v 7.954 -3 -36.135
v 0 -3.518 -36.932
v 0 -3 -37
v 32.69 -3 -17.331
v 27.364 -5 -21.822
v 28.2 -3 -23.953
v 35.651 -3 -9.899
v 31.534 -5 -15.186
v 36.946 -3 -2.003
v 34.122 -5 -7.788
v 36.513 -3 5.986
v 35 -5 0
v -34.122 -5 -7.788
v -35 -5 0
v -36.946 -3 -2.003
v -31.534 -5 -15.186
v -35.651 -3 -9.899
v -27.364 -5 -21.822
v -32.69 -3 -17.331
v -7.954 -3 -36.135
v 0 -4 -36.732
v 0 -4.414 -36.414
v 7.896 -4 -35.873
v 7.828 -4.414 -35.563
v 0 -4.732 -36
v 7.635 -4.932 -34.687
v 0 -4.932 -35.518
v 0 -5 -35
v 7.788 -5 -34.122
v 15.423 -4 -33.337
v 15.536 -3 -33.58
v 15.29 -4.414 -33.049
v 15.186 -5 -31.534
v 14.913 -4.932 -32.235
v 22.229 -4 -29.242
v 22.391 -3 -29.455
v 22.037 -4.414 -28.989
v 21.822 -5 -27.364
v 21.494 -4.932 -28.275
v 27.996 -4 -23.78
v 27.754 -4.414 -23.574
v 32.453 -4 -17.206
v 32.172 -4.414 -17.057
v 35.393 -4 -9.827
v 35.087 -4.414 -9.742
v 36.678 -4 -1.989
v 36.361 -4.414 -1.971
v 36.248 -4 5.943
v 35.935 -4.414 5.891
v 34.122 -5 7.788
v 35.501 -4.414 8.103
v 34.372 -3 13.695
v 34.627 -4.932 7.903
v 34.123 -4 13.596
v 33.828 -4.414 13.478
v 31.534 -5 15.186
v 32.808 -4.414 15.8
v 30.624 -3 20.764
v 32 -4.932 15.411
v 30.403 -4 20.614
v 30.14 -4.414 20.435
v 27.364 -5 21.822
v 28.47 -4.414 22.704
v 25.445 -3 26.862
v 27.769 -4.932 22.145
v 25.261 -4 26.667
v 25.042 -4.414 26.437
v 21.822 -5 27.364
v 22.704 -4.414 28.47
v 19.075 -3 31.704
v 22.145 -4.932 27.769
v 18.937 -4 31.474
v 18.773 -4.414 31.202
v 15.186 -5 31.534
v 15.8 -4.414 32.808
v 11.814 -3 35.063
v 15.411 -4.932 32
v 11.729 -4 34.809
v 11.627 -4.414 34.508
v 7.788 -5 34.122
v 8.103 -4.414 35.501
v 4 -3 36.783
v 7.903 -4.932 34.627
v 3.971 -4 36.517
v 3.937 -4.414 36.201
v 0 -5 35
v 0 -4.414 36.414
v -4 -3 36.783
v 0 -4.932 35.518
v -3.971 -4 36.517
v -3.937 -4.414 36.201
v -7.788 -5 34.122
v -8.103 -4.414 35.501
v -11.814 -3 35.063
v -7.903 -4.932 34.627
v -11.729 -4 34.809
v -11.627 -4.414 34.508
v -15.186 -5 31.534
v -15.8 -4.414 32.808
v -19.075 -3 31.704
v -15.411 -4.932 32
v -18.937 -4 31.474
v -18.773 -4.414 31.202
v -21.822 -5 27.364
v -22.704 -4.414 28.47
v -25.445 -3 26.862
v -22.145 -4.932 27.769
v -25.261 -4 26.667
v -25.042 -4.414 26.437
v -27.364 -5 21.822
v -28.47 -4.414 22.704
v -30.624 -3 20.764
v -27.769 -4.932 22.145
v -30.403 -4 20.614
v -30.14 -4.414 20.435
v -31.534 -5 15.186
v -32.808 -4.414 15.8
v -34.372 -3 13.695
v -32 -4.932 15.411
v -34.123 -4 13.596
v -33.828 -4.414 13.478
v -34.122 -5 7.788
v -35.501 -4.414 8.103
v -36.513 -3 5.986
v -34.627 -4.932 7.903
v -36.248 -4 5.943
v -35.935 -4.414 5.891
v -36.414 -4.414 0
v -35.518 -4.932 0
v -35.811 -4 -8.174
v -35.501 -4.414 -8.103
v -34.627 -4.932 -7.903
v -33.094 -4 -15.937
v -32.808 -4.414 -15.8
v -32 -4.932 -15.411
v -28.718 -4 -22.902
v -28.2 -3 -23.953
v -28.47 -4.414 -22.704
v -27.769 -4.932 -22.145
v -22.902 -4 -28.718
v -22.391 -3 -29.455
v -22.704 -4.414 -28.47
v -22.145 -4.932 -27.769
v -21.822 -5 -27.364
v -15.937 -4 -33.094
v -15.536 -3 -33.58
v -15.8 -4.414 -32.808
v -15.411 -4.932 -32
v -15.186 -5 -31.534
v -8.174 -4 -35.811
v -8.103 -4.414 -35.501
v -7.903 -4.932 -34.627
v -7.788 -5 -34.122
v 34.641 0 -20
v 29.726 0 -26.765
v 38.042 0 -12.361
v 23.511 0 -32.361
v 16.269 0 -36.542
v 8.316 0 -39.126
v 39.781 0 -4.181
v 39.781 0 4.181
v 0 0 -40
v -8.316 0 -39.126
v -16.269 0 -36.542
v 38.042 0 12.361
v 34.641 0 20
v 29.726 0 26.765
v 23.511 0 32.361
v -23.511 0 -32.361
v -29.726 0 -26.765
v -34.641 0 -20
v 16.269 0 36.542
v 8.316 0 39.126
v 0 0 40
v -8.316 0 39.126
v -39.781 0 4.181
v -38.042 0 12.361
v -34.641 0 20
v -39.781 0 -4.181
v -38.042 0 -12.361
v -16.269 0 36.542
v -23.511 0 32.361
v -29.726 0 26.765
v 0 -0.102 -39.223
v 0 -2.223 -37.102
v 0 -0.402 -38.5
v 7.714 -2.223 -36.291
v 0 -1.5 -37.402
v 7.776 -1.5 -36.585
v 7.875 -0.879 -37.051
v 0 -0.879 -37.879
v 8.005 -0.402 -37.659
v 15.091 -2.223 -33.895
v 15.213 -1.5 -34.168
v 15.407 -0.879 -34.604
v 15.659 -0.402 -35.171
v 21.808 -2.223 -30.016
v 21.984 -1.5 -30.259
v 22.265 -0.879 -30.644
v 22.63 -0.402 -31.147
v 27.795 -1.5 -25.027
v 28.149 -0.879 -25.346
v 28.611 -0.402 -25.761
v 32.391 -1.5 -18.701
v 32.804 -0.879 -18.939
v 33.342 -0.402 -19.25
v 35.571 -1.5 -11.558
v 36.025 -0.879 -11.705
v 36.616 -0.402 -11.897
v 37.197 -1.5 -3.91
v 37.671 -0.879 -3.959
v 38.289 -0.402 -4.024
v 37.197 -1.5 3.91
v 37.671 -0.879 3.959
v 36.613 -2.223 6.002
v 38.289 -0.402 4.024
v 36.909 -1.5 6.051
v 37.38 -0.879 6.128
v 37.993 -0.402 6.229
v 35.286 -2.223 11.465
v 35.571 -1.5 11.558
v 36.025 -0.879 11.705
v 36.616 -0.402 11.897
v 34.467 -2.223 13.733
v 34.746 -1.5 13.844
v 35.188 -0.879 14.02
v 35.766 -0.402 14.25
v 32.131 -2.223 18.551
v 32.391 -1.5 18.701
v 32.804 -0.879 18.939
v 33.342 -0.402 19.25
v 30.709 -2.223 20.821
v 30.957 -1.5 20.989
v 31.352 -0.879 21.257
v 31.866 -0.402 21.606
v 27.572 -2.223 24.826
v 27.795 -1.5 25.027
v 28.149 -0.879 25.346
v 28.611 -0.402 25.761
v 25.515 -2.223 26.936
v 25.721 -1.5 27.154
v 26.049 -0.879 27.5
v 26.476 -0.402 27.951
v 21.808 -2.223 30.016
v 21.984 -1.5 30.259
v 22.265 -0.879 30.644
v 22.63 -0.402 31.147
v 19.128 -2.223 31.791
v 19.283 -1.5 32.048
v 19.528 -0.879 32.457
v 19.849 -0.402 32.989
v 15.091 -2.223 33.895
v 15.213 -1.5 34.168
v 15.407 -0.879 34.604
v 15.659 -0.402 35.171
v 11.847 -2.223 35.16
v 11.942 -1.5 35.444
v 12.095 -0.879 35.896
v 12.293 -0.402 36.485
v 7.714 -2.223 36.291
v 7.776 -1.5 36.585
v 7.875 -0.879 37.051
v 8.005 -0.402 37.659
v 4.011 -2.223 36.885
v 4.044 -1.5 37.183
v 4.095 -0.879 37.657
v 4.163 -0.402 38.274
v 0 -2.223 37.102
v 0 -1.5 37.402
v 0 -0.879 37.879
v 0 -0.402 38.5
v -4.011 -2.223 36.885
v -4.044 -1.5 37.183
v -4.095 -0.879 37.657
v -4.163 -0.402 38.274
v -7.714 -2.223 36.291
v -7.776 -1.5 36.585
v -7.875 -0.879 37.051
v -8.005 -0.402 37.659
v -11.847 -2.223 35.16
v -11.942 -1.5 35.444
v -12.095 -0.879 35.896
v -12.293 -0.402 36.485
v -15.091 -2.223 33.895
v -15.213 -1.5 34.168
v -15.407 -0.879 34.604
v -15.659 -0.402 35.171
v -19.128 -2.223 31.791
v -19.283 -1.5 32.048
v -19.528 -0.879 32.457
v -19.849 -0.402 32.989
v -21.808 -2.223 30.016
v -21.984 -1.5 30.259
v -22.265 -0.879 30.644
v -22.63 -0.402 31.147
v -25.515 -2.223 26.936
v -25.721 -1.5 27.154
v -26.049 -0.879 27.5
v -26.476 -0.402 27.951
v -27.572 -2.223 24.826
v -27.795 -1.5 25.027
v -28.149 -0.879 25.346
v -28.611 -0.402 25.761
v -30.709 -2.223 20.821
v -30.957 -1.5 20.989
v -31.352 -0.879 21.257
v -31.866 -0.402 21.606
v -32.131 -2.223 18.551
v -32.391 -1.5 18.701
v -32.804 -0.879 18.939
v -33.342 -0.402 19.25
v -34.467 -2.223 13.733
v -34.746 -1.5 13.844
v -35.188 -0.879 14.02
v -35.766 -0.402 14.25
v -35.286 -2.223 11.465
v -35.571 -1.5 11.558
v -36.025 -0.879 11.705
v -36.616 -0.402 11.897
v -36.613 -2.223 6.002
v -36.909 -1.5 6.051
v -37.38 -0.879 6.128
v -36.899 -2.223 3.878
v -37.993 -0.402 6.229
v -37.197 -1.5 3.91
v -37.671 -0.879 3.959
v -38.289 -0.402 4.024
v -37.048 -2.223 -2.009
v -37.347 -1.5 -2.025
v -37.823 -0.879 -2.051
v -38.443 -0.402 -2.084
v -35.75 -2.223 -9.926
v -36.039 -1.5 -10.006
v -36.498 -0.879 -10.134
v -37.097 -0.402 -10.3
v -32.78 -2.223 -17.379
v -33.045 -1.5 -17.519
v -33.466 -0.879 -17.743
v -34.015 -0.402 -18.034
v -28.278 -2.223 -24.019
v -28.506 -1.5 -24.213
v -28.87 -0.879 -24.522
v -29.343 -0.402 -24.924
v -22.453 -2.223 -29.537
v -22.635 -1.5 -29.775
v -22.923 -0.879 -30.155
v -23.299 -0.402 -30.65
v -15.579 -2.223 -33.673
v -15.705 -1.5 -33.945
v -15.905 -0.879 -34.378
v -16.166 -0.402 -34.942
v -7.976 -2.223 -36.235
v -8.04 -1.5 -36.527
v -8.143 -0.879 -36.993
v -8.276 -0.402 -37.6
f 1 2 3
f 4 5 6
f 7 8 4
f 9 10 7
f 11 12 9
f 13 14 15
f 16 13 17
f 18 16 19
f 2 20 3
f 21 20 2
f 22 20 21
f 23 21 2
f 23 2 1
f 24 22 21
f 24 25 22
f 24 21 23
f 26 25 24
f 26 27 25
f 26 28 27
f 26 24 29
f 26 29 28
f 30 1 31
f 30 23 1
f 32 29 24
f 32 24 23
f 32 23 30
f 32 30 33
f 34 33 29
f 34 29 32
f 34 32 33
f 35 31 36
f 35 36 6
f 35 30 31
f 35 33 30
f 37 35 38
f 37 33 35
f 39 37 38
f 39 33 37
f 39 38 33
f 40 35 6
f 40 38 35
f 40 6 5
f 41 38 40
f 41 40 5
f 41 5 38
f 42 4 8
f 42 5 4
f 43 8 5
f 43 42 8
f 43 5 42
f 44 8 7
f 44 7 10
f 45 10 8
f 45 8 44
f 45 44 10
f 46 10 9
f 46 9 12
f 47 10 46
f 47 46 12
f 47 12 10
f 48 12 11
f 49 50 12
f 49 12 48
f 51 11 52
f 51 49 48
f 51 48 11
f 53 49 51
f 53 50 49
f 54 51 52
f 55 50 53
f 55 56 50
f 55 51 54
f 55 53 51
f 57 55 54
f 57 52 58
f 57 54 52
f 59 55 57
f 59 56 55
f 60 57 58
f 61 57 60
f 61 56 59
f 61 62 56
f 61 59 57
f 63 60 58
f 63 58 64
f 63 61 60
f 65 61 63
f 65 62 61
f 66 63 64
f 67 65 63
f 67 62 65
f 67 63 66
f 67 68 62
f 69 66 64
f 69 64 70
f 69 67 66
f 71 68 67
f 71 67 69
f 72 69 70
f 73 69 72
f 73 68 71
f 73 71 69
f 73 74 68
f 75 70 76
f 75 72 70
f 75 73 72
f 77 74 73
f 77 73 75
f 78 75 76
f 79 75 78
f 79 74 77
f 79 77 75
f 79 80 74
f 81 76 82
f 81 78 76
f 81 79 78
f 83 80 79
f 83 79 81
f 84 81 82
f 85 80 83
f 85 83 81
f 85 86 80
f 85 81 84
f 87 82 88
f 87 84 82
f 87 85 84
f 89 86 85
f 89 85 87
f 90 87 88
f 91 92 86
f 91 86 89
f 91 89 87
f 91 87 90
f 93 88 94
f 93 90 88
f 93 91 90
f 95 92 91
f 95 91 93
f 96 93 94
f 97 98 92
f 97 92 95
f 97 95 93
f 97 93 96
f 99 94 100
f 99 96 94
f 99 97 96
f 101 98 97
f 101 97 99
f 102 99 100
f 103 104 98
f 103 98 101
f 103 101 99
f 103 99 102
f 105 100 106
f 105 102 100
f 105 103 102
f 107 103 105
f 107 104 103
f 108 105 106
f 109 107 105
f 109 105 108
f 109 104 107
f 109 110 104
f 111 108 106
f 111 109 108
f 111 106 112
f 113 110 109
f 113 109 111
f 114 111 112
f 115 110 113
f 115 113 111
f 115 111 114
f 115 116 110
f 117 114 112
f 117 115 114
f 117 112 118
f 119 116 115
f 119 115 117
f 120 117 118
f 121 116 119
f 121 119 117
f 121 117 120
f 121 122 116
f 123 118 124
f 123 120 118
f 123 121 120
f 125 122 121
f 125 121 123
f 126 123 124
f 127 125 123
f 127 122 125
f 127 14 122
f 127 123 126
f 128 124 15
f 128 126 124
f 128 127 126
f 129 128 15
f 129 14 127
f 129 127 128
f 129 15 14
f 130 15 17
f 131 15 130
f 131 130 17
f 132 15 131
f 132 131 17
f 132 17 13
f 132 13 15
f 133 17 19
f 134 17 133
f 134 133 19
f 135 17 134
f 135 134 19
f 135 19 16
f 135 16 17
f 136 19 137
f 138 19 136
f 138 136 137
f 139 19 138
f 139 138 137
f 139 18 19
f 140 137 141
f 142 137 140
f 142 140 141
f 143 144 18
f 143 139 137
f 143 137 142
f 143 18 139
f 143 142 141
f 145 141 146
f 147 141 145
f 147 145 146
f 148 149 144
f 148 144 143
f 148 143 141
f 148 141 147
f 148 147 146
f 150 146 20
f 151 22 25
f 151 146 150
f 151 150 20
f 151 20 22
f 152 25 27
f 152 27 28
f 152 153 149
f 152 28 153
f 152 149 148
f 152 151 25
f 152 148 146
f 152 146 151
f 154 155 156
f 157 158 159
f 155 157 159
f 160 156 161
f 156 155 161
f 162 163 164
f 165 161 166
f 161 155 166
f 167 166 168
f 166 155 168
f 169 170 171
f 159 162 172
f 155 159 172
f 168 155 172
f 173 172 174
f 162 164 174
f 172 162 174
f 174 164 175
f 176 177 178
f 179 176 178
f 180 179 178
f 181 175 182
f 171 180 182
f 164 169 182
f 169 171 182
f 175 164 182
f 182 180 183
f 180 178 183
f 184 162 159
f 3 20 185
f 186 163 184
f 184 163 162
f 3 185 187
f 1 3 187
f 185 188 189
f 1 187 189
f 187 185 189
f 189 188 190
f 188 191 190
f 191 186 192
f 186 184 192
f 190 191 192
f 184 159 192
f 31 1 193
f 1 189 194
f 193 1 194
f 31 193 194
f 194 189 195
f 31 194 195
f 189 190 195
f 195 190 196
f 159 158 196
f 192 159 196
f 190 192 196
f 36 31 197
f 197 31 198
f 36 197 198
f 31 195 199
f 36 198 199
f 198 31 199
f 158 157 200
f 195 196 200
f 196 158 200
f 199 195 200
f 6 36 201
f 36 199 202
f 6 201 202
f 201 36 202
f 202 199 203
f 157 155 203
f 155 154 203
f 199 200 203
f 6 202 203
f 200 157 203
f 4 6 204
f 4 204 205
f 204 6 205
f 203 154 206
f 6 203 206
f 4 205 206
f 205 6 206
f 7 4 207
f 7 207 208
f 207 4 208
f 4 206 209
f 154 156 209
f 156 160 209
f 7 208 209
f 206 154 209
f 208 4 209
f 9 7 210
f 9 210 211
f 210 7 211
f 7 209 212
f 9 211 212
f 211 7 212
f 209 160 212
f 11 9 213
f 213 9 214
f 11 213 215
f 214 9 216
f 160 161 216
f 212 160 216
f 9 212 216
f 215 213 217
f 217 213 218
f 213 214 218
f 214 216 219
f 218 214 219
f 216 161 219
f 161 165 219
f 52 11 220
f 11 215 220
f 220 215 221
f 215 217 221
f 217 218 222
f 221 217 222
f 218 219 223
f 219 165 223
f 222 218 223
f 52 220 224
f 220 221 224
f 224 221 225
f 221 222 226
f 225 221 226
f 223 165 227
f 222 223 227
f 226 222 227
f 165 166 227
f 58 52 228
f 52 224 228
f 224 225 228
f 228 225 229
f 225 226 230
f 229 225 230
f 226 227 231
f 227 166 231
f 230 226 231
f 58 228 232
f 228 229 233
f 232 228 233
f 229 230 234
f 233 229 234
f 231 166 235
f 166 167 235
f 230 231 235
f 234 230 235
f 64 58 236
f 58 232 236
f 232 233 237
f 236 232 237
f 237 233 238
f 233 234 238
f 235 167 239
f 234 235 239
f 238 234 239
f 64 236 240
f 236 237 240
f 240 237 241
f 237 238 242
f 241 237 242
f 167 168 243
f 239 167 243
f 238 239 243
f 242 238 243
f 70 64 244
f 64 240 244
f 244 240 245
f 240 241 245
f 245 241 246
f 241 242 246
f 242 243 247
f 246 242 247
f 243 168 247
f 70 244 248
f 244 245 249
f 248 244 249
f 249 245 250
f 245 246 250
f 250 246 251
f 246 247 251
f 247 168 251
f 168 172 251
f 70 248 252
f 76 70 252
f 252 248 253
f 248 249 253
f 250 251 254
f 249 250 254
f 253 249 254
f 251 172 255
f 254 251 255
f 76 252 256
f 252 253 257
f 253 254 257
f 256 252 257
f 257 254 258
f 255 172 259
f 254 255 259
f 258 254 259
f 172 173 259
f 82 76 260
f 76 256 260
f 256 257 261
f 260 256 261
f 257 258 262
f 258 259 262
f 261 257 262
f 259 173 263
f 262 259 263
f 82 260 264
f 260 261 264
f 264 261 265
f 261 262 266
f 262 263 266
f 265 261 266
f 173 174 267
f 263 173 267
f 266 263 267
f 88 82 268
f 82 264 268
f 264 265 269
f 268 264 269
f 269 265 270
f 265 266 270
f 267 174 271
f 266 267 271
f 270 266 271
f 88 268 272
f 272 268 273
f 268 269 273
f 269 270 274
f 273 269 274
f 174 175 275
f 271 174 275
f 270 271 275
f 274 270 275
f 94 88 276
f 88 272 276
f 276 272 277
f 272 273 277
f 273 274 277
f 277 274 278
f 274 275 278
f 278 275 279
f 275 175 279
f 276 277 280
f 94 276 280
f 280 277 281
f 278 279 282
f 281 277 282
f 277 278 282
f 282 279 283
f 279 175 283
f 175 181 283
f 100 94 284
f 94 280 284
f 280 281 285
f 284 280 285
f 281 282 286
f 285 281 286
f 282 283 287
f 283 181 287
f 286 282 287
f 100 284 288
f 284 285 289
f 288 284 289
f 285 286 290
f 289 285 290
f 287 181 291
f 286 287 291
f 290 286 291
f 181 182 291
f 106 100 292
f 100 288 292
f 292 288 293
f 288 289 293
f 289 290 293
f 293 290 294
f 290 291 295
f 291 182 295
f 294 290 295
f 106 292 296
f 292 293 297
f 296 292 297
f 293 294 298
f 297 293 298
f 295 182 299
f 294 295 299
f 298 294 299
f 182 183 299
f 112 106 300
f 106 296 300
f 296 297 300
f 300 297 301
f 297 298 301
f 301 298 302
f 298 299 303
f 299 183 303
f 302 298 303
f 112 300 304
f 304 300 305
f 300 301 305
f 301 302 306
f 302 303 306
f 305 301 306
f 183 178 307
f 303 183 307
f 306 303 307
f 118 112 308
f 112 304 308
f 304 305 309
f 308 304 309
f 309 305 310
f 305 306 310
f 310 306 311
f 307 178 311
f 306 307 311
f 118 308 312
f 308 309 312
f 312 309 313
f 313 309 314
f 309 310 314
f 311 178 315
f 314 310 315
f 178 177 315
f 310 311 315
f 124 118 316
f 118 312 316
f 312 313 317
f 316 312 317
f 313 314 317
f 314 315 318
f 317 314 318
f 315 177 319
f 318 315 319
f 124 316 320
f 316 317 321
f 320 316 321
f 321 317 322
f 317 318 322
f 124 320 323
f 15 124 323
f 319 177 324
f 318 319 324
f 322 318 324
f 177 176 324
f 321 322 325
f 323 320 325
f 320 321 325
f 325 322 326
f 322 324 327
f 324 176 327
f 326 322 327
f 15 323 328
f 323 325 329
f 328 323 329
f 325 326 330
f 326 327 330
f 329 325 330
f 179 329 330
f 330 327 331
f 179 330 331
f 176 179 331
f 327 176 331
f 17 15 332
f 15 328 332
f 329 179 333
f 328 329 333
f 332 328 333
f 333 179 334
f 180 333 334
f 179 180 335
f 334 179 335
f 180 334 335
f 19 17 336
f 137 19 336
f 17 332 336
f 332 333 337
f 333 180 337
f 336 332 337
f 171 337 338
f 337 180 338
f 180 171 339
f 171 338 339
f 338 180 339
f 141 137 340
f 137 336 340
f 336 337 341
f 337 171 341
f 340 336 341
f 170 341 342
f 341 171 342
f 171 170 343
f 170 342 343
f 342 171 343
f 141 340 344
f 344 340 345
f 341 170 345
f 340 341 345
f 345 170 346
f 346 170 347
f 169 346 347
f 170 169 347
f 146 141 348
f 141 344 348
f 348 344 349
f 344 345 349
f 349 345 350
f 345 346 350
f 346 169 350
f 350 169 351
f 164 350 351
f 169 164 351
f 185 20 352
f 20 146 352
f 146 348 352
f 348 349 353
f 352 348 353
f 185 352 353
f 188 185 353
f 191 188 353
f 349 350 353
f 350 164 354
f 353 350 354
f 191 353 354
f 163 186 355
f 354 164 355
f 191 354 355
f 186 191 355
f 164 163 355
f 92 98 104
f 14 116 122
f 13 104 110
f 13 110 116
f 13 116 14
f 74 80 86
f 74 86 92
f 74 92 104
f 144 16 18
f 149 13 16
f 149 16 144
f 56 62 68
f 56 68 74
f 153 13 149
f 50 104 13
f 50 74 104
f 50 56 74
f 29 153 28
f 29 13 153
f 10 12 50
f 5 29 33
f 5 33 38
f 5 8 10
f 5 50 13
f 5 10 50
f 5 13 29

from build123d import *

# Parameters (mm, degrees)
SKETCH1_W           = 200
SKETCH1_H           = 2
BOSS_EXTRUDE1_DEPTH = 60
SKETCH2_R           = 37
BOSS_EXTRUDE2_DEPTH = 5
FILLET1_R           = 2
FILLET2_R           = 3
SKETCH4_W           = 120
SKETCH4_H           = 2
CUT_EXTRUDE1_DEPTH  = 209.865985742


with BuildPart() as part:
    # Sketch1 → Boss-Extrude1 (new, symmetric)
    with BuildSketch(Plane.XY):
        with Locations((0, 1)):
            Rectangle(SKETCH1_W, SKETCH1_H)
    extrude(amount=BOSS_EXTRUDE1_DEPTH, both=True)

    # Sketch2 → Boss-Extrude2 (add)
    with BuildSketch(Plane.XZ):
        with Locations(Location((0, 0, 0), (0, 0, 270))):
            Circle(SKETCH2_R)
    extrude(amount=BOSS_EXTRUDE2_DEPTH)

    # Fillet1
    fillet1_edges = [part.edges().sort_by_distance(p)[0] for p in [
        (0, -5, 37),
    ]]
    fillet(fillet1_edges, radius=FILLET1_R)

    # Fillet2
    fillet2_edges = [part.edges().sort_by_distance(p)[0] for p in [
        (0, 0, 37),
    ]]
    fillet(fillet2_edges, radius=FILLET2_R - 0.0001)  # a hair under: the kernel refuses the full size

    # Sketch4 → Cut-Extrude1 (cut, through all)
    with BuildSketch(Plane.ZY.offset(100)):
        with Locations((0, 1)):
            Rectangle(SKETCH4_W, SKETCH4_H)
    extrude(amount=-CUT_EXTRUDE1_DEPTH, mode=Mode.SUBTRACT)


solid = part.part
